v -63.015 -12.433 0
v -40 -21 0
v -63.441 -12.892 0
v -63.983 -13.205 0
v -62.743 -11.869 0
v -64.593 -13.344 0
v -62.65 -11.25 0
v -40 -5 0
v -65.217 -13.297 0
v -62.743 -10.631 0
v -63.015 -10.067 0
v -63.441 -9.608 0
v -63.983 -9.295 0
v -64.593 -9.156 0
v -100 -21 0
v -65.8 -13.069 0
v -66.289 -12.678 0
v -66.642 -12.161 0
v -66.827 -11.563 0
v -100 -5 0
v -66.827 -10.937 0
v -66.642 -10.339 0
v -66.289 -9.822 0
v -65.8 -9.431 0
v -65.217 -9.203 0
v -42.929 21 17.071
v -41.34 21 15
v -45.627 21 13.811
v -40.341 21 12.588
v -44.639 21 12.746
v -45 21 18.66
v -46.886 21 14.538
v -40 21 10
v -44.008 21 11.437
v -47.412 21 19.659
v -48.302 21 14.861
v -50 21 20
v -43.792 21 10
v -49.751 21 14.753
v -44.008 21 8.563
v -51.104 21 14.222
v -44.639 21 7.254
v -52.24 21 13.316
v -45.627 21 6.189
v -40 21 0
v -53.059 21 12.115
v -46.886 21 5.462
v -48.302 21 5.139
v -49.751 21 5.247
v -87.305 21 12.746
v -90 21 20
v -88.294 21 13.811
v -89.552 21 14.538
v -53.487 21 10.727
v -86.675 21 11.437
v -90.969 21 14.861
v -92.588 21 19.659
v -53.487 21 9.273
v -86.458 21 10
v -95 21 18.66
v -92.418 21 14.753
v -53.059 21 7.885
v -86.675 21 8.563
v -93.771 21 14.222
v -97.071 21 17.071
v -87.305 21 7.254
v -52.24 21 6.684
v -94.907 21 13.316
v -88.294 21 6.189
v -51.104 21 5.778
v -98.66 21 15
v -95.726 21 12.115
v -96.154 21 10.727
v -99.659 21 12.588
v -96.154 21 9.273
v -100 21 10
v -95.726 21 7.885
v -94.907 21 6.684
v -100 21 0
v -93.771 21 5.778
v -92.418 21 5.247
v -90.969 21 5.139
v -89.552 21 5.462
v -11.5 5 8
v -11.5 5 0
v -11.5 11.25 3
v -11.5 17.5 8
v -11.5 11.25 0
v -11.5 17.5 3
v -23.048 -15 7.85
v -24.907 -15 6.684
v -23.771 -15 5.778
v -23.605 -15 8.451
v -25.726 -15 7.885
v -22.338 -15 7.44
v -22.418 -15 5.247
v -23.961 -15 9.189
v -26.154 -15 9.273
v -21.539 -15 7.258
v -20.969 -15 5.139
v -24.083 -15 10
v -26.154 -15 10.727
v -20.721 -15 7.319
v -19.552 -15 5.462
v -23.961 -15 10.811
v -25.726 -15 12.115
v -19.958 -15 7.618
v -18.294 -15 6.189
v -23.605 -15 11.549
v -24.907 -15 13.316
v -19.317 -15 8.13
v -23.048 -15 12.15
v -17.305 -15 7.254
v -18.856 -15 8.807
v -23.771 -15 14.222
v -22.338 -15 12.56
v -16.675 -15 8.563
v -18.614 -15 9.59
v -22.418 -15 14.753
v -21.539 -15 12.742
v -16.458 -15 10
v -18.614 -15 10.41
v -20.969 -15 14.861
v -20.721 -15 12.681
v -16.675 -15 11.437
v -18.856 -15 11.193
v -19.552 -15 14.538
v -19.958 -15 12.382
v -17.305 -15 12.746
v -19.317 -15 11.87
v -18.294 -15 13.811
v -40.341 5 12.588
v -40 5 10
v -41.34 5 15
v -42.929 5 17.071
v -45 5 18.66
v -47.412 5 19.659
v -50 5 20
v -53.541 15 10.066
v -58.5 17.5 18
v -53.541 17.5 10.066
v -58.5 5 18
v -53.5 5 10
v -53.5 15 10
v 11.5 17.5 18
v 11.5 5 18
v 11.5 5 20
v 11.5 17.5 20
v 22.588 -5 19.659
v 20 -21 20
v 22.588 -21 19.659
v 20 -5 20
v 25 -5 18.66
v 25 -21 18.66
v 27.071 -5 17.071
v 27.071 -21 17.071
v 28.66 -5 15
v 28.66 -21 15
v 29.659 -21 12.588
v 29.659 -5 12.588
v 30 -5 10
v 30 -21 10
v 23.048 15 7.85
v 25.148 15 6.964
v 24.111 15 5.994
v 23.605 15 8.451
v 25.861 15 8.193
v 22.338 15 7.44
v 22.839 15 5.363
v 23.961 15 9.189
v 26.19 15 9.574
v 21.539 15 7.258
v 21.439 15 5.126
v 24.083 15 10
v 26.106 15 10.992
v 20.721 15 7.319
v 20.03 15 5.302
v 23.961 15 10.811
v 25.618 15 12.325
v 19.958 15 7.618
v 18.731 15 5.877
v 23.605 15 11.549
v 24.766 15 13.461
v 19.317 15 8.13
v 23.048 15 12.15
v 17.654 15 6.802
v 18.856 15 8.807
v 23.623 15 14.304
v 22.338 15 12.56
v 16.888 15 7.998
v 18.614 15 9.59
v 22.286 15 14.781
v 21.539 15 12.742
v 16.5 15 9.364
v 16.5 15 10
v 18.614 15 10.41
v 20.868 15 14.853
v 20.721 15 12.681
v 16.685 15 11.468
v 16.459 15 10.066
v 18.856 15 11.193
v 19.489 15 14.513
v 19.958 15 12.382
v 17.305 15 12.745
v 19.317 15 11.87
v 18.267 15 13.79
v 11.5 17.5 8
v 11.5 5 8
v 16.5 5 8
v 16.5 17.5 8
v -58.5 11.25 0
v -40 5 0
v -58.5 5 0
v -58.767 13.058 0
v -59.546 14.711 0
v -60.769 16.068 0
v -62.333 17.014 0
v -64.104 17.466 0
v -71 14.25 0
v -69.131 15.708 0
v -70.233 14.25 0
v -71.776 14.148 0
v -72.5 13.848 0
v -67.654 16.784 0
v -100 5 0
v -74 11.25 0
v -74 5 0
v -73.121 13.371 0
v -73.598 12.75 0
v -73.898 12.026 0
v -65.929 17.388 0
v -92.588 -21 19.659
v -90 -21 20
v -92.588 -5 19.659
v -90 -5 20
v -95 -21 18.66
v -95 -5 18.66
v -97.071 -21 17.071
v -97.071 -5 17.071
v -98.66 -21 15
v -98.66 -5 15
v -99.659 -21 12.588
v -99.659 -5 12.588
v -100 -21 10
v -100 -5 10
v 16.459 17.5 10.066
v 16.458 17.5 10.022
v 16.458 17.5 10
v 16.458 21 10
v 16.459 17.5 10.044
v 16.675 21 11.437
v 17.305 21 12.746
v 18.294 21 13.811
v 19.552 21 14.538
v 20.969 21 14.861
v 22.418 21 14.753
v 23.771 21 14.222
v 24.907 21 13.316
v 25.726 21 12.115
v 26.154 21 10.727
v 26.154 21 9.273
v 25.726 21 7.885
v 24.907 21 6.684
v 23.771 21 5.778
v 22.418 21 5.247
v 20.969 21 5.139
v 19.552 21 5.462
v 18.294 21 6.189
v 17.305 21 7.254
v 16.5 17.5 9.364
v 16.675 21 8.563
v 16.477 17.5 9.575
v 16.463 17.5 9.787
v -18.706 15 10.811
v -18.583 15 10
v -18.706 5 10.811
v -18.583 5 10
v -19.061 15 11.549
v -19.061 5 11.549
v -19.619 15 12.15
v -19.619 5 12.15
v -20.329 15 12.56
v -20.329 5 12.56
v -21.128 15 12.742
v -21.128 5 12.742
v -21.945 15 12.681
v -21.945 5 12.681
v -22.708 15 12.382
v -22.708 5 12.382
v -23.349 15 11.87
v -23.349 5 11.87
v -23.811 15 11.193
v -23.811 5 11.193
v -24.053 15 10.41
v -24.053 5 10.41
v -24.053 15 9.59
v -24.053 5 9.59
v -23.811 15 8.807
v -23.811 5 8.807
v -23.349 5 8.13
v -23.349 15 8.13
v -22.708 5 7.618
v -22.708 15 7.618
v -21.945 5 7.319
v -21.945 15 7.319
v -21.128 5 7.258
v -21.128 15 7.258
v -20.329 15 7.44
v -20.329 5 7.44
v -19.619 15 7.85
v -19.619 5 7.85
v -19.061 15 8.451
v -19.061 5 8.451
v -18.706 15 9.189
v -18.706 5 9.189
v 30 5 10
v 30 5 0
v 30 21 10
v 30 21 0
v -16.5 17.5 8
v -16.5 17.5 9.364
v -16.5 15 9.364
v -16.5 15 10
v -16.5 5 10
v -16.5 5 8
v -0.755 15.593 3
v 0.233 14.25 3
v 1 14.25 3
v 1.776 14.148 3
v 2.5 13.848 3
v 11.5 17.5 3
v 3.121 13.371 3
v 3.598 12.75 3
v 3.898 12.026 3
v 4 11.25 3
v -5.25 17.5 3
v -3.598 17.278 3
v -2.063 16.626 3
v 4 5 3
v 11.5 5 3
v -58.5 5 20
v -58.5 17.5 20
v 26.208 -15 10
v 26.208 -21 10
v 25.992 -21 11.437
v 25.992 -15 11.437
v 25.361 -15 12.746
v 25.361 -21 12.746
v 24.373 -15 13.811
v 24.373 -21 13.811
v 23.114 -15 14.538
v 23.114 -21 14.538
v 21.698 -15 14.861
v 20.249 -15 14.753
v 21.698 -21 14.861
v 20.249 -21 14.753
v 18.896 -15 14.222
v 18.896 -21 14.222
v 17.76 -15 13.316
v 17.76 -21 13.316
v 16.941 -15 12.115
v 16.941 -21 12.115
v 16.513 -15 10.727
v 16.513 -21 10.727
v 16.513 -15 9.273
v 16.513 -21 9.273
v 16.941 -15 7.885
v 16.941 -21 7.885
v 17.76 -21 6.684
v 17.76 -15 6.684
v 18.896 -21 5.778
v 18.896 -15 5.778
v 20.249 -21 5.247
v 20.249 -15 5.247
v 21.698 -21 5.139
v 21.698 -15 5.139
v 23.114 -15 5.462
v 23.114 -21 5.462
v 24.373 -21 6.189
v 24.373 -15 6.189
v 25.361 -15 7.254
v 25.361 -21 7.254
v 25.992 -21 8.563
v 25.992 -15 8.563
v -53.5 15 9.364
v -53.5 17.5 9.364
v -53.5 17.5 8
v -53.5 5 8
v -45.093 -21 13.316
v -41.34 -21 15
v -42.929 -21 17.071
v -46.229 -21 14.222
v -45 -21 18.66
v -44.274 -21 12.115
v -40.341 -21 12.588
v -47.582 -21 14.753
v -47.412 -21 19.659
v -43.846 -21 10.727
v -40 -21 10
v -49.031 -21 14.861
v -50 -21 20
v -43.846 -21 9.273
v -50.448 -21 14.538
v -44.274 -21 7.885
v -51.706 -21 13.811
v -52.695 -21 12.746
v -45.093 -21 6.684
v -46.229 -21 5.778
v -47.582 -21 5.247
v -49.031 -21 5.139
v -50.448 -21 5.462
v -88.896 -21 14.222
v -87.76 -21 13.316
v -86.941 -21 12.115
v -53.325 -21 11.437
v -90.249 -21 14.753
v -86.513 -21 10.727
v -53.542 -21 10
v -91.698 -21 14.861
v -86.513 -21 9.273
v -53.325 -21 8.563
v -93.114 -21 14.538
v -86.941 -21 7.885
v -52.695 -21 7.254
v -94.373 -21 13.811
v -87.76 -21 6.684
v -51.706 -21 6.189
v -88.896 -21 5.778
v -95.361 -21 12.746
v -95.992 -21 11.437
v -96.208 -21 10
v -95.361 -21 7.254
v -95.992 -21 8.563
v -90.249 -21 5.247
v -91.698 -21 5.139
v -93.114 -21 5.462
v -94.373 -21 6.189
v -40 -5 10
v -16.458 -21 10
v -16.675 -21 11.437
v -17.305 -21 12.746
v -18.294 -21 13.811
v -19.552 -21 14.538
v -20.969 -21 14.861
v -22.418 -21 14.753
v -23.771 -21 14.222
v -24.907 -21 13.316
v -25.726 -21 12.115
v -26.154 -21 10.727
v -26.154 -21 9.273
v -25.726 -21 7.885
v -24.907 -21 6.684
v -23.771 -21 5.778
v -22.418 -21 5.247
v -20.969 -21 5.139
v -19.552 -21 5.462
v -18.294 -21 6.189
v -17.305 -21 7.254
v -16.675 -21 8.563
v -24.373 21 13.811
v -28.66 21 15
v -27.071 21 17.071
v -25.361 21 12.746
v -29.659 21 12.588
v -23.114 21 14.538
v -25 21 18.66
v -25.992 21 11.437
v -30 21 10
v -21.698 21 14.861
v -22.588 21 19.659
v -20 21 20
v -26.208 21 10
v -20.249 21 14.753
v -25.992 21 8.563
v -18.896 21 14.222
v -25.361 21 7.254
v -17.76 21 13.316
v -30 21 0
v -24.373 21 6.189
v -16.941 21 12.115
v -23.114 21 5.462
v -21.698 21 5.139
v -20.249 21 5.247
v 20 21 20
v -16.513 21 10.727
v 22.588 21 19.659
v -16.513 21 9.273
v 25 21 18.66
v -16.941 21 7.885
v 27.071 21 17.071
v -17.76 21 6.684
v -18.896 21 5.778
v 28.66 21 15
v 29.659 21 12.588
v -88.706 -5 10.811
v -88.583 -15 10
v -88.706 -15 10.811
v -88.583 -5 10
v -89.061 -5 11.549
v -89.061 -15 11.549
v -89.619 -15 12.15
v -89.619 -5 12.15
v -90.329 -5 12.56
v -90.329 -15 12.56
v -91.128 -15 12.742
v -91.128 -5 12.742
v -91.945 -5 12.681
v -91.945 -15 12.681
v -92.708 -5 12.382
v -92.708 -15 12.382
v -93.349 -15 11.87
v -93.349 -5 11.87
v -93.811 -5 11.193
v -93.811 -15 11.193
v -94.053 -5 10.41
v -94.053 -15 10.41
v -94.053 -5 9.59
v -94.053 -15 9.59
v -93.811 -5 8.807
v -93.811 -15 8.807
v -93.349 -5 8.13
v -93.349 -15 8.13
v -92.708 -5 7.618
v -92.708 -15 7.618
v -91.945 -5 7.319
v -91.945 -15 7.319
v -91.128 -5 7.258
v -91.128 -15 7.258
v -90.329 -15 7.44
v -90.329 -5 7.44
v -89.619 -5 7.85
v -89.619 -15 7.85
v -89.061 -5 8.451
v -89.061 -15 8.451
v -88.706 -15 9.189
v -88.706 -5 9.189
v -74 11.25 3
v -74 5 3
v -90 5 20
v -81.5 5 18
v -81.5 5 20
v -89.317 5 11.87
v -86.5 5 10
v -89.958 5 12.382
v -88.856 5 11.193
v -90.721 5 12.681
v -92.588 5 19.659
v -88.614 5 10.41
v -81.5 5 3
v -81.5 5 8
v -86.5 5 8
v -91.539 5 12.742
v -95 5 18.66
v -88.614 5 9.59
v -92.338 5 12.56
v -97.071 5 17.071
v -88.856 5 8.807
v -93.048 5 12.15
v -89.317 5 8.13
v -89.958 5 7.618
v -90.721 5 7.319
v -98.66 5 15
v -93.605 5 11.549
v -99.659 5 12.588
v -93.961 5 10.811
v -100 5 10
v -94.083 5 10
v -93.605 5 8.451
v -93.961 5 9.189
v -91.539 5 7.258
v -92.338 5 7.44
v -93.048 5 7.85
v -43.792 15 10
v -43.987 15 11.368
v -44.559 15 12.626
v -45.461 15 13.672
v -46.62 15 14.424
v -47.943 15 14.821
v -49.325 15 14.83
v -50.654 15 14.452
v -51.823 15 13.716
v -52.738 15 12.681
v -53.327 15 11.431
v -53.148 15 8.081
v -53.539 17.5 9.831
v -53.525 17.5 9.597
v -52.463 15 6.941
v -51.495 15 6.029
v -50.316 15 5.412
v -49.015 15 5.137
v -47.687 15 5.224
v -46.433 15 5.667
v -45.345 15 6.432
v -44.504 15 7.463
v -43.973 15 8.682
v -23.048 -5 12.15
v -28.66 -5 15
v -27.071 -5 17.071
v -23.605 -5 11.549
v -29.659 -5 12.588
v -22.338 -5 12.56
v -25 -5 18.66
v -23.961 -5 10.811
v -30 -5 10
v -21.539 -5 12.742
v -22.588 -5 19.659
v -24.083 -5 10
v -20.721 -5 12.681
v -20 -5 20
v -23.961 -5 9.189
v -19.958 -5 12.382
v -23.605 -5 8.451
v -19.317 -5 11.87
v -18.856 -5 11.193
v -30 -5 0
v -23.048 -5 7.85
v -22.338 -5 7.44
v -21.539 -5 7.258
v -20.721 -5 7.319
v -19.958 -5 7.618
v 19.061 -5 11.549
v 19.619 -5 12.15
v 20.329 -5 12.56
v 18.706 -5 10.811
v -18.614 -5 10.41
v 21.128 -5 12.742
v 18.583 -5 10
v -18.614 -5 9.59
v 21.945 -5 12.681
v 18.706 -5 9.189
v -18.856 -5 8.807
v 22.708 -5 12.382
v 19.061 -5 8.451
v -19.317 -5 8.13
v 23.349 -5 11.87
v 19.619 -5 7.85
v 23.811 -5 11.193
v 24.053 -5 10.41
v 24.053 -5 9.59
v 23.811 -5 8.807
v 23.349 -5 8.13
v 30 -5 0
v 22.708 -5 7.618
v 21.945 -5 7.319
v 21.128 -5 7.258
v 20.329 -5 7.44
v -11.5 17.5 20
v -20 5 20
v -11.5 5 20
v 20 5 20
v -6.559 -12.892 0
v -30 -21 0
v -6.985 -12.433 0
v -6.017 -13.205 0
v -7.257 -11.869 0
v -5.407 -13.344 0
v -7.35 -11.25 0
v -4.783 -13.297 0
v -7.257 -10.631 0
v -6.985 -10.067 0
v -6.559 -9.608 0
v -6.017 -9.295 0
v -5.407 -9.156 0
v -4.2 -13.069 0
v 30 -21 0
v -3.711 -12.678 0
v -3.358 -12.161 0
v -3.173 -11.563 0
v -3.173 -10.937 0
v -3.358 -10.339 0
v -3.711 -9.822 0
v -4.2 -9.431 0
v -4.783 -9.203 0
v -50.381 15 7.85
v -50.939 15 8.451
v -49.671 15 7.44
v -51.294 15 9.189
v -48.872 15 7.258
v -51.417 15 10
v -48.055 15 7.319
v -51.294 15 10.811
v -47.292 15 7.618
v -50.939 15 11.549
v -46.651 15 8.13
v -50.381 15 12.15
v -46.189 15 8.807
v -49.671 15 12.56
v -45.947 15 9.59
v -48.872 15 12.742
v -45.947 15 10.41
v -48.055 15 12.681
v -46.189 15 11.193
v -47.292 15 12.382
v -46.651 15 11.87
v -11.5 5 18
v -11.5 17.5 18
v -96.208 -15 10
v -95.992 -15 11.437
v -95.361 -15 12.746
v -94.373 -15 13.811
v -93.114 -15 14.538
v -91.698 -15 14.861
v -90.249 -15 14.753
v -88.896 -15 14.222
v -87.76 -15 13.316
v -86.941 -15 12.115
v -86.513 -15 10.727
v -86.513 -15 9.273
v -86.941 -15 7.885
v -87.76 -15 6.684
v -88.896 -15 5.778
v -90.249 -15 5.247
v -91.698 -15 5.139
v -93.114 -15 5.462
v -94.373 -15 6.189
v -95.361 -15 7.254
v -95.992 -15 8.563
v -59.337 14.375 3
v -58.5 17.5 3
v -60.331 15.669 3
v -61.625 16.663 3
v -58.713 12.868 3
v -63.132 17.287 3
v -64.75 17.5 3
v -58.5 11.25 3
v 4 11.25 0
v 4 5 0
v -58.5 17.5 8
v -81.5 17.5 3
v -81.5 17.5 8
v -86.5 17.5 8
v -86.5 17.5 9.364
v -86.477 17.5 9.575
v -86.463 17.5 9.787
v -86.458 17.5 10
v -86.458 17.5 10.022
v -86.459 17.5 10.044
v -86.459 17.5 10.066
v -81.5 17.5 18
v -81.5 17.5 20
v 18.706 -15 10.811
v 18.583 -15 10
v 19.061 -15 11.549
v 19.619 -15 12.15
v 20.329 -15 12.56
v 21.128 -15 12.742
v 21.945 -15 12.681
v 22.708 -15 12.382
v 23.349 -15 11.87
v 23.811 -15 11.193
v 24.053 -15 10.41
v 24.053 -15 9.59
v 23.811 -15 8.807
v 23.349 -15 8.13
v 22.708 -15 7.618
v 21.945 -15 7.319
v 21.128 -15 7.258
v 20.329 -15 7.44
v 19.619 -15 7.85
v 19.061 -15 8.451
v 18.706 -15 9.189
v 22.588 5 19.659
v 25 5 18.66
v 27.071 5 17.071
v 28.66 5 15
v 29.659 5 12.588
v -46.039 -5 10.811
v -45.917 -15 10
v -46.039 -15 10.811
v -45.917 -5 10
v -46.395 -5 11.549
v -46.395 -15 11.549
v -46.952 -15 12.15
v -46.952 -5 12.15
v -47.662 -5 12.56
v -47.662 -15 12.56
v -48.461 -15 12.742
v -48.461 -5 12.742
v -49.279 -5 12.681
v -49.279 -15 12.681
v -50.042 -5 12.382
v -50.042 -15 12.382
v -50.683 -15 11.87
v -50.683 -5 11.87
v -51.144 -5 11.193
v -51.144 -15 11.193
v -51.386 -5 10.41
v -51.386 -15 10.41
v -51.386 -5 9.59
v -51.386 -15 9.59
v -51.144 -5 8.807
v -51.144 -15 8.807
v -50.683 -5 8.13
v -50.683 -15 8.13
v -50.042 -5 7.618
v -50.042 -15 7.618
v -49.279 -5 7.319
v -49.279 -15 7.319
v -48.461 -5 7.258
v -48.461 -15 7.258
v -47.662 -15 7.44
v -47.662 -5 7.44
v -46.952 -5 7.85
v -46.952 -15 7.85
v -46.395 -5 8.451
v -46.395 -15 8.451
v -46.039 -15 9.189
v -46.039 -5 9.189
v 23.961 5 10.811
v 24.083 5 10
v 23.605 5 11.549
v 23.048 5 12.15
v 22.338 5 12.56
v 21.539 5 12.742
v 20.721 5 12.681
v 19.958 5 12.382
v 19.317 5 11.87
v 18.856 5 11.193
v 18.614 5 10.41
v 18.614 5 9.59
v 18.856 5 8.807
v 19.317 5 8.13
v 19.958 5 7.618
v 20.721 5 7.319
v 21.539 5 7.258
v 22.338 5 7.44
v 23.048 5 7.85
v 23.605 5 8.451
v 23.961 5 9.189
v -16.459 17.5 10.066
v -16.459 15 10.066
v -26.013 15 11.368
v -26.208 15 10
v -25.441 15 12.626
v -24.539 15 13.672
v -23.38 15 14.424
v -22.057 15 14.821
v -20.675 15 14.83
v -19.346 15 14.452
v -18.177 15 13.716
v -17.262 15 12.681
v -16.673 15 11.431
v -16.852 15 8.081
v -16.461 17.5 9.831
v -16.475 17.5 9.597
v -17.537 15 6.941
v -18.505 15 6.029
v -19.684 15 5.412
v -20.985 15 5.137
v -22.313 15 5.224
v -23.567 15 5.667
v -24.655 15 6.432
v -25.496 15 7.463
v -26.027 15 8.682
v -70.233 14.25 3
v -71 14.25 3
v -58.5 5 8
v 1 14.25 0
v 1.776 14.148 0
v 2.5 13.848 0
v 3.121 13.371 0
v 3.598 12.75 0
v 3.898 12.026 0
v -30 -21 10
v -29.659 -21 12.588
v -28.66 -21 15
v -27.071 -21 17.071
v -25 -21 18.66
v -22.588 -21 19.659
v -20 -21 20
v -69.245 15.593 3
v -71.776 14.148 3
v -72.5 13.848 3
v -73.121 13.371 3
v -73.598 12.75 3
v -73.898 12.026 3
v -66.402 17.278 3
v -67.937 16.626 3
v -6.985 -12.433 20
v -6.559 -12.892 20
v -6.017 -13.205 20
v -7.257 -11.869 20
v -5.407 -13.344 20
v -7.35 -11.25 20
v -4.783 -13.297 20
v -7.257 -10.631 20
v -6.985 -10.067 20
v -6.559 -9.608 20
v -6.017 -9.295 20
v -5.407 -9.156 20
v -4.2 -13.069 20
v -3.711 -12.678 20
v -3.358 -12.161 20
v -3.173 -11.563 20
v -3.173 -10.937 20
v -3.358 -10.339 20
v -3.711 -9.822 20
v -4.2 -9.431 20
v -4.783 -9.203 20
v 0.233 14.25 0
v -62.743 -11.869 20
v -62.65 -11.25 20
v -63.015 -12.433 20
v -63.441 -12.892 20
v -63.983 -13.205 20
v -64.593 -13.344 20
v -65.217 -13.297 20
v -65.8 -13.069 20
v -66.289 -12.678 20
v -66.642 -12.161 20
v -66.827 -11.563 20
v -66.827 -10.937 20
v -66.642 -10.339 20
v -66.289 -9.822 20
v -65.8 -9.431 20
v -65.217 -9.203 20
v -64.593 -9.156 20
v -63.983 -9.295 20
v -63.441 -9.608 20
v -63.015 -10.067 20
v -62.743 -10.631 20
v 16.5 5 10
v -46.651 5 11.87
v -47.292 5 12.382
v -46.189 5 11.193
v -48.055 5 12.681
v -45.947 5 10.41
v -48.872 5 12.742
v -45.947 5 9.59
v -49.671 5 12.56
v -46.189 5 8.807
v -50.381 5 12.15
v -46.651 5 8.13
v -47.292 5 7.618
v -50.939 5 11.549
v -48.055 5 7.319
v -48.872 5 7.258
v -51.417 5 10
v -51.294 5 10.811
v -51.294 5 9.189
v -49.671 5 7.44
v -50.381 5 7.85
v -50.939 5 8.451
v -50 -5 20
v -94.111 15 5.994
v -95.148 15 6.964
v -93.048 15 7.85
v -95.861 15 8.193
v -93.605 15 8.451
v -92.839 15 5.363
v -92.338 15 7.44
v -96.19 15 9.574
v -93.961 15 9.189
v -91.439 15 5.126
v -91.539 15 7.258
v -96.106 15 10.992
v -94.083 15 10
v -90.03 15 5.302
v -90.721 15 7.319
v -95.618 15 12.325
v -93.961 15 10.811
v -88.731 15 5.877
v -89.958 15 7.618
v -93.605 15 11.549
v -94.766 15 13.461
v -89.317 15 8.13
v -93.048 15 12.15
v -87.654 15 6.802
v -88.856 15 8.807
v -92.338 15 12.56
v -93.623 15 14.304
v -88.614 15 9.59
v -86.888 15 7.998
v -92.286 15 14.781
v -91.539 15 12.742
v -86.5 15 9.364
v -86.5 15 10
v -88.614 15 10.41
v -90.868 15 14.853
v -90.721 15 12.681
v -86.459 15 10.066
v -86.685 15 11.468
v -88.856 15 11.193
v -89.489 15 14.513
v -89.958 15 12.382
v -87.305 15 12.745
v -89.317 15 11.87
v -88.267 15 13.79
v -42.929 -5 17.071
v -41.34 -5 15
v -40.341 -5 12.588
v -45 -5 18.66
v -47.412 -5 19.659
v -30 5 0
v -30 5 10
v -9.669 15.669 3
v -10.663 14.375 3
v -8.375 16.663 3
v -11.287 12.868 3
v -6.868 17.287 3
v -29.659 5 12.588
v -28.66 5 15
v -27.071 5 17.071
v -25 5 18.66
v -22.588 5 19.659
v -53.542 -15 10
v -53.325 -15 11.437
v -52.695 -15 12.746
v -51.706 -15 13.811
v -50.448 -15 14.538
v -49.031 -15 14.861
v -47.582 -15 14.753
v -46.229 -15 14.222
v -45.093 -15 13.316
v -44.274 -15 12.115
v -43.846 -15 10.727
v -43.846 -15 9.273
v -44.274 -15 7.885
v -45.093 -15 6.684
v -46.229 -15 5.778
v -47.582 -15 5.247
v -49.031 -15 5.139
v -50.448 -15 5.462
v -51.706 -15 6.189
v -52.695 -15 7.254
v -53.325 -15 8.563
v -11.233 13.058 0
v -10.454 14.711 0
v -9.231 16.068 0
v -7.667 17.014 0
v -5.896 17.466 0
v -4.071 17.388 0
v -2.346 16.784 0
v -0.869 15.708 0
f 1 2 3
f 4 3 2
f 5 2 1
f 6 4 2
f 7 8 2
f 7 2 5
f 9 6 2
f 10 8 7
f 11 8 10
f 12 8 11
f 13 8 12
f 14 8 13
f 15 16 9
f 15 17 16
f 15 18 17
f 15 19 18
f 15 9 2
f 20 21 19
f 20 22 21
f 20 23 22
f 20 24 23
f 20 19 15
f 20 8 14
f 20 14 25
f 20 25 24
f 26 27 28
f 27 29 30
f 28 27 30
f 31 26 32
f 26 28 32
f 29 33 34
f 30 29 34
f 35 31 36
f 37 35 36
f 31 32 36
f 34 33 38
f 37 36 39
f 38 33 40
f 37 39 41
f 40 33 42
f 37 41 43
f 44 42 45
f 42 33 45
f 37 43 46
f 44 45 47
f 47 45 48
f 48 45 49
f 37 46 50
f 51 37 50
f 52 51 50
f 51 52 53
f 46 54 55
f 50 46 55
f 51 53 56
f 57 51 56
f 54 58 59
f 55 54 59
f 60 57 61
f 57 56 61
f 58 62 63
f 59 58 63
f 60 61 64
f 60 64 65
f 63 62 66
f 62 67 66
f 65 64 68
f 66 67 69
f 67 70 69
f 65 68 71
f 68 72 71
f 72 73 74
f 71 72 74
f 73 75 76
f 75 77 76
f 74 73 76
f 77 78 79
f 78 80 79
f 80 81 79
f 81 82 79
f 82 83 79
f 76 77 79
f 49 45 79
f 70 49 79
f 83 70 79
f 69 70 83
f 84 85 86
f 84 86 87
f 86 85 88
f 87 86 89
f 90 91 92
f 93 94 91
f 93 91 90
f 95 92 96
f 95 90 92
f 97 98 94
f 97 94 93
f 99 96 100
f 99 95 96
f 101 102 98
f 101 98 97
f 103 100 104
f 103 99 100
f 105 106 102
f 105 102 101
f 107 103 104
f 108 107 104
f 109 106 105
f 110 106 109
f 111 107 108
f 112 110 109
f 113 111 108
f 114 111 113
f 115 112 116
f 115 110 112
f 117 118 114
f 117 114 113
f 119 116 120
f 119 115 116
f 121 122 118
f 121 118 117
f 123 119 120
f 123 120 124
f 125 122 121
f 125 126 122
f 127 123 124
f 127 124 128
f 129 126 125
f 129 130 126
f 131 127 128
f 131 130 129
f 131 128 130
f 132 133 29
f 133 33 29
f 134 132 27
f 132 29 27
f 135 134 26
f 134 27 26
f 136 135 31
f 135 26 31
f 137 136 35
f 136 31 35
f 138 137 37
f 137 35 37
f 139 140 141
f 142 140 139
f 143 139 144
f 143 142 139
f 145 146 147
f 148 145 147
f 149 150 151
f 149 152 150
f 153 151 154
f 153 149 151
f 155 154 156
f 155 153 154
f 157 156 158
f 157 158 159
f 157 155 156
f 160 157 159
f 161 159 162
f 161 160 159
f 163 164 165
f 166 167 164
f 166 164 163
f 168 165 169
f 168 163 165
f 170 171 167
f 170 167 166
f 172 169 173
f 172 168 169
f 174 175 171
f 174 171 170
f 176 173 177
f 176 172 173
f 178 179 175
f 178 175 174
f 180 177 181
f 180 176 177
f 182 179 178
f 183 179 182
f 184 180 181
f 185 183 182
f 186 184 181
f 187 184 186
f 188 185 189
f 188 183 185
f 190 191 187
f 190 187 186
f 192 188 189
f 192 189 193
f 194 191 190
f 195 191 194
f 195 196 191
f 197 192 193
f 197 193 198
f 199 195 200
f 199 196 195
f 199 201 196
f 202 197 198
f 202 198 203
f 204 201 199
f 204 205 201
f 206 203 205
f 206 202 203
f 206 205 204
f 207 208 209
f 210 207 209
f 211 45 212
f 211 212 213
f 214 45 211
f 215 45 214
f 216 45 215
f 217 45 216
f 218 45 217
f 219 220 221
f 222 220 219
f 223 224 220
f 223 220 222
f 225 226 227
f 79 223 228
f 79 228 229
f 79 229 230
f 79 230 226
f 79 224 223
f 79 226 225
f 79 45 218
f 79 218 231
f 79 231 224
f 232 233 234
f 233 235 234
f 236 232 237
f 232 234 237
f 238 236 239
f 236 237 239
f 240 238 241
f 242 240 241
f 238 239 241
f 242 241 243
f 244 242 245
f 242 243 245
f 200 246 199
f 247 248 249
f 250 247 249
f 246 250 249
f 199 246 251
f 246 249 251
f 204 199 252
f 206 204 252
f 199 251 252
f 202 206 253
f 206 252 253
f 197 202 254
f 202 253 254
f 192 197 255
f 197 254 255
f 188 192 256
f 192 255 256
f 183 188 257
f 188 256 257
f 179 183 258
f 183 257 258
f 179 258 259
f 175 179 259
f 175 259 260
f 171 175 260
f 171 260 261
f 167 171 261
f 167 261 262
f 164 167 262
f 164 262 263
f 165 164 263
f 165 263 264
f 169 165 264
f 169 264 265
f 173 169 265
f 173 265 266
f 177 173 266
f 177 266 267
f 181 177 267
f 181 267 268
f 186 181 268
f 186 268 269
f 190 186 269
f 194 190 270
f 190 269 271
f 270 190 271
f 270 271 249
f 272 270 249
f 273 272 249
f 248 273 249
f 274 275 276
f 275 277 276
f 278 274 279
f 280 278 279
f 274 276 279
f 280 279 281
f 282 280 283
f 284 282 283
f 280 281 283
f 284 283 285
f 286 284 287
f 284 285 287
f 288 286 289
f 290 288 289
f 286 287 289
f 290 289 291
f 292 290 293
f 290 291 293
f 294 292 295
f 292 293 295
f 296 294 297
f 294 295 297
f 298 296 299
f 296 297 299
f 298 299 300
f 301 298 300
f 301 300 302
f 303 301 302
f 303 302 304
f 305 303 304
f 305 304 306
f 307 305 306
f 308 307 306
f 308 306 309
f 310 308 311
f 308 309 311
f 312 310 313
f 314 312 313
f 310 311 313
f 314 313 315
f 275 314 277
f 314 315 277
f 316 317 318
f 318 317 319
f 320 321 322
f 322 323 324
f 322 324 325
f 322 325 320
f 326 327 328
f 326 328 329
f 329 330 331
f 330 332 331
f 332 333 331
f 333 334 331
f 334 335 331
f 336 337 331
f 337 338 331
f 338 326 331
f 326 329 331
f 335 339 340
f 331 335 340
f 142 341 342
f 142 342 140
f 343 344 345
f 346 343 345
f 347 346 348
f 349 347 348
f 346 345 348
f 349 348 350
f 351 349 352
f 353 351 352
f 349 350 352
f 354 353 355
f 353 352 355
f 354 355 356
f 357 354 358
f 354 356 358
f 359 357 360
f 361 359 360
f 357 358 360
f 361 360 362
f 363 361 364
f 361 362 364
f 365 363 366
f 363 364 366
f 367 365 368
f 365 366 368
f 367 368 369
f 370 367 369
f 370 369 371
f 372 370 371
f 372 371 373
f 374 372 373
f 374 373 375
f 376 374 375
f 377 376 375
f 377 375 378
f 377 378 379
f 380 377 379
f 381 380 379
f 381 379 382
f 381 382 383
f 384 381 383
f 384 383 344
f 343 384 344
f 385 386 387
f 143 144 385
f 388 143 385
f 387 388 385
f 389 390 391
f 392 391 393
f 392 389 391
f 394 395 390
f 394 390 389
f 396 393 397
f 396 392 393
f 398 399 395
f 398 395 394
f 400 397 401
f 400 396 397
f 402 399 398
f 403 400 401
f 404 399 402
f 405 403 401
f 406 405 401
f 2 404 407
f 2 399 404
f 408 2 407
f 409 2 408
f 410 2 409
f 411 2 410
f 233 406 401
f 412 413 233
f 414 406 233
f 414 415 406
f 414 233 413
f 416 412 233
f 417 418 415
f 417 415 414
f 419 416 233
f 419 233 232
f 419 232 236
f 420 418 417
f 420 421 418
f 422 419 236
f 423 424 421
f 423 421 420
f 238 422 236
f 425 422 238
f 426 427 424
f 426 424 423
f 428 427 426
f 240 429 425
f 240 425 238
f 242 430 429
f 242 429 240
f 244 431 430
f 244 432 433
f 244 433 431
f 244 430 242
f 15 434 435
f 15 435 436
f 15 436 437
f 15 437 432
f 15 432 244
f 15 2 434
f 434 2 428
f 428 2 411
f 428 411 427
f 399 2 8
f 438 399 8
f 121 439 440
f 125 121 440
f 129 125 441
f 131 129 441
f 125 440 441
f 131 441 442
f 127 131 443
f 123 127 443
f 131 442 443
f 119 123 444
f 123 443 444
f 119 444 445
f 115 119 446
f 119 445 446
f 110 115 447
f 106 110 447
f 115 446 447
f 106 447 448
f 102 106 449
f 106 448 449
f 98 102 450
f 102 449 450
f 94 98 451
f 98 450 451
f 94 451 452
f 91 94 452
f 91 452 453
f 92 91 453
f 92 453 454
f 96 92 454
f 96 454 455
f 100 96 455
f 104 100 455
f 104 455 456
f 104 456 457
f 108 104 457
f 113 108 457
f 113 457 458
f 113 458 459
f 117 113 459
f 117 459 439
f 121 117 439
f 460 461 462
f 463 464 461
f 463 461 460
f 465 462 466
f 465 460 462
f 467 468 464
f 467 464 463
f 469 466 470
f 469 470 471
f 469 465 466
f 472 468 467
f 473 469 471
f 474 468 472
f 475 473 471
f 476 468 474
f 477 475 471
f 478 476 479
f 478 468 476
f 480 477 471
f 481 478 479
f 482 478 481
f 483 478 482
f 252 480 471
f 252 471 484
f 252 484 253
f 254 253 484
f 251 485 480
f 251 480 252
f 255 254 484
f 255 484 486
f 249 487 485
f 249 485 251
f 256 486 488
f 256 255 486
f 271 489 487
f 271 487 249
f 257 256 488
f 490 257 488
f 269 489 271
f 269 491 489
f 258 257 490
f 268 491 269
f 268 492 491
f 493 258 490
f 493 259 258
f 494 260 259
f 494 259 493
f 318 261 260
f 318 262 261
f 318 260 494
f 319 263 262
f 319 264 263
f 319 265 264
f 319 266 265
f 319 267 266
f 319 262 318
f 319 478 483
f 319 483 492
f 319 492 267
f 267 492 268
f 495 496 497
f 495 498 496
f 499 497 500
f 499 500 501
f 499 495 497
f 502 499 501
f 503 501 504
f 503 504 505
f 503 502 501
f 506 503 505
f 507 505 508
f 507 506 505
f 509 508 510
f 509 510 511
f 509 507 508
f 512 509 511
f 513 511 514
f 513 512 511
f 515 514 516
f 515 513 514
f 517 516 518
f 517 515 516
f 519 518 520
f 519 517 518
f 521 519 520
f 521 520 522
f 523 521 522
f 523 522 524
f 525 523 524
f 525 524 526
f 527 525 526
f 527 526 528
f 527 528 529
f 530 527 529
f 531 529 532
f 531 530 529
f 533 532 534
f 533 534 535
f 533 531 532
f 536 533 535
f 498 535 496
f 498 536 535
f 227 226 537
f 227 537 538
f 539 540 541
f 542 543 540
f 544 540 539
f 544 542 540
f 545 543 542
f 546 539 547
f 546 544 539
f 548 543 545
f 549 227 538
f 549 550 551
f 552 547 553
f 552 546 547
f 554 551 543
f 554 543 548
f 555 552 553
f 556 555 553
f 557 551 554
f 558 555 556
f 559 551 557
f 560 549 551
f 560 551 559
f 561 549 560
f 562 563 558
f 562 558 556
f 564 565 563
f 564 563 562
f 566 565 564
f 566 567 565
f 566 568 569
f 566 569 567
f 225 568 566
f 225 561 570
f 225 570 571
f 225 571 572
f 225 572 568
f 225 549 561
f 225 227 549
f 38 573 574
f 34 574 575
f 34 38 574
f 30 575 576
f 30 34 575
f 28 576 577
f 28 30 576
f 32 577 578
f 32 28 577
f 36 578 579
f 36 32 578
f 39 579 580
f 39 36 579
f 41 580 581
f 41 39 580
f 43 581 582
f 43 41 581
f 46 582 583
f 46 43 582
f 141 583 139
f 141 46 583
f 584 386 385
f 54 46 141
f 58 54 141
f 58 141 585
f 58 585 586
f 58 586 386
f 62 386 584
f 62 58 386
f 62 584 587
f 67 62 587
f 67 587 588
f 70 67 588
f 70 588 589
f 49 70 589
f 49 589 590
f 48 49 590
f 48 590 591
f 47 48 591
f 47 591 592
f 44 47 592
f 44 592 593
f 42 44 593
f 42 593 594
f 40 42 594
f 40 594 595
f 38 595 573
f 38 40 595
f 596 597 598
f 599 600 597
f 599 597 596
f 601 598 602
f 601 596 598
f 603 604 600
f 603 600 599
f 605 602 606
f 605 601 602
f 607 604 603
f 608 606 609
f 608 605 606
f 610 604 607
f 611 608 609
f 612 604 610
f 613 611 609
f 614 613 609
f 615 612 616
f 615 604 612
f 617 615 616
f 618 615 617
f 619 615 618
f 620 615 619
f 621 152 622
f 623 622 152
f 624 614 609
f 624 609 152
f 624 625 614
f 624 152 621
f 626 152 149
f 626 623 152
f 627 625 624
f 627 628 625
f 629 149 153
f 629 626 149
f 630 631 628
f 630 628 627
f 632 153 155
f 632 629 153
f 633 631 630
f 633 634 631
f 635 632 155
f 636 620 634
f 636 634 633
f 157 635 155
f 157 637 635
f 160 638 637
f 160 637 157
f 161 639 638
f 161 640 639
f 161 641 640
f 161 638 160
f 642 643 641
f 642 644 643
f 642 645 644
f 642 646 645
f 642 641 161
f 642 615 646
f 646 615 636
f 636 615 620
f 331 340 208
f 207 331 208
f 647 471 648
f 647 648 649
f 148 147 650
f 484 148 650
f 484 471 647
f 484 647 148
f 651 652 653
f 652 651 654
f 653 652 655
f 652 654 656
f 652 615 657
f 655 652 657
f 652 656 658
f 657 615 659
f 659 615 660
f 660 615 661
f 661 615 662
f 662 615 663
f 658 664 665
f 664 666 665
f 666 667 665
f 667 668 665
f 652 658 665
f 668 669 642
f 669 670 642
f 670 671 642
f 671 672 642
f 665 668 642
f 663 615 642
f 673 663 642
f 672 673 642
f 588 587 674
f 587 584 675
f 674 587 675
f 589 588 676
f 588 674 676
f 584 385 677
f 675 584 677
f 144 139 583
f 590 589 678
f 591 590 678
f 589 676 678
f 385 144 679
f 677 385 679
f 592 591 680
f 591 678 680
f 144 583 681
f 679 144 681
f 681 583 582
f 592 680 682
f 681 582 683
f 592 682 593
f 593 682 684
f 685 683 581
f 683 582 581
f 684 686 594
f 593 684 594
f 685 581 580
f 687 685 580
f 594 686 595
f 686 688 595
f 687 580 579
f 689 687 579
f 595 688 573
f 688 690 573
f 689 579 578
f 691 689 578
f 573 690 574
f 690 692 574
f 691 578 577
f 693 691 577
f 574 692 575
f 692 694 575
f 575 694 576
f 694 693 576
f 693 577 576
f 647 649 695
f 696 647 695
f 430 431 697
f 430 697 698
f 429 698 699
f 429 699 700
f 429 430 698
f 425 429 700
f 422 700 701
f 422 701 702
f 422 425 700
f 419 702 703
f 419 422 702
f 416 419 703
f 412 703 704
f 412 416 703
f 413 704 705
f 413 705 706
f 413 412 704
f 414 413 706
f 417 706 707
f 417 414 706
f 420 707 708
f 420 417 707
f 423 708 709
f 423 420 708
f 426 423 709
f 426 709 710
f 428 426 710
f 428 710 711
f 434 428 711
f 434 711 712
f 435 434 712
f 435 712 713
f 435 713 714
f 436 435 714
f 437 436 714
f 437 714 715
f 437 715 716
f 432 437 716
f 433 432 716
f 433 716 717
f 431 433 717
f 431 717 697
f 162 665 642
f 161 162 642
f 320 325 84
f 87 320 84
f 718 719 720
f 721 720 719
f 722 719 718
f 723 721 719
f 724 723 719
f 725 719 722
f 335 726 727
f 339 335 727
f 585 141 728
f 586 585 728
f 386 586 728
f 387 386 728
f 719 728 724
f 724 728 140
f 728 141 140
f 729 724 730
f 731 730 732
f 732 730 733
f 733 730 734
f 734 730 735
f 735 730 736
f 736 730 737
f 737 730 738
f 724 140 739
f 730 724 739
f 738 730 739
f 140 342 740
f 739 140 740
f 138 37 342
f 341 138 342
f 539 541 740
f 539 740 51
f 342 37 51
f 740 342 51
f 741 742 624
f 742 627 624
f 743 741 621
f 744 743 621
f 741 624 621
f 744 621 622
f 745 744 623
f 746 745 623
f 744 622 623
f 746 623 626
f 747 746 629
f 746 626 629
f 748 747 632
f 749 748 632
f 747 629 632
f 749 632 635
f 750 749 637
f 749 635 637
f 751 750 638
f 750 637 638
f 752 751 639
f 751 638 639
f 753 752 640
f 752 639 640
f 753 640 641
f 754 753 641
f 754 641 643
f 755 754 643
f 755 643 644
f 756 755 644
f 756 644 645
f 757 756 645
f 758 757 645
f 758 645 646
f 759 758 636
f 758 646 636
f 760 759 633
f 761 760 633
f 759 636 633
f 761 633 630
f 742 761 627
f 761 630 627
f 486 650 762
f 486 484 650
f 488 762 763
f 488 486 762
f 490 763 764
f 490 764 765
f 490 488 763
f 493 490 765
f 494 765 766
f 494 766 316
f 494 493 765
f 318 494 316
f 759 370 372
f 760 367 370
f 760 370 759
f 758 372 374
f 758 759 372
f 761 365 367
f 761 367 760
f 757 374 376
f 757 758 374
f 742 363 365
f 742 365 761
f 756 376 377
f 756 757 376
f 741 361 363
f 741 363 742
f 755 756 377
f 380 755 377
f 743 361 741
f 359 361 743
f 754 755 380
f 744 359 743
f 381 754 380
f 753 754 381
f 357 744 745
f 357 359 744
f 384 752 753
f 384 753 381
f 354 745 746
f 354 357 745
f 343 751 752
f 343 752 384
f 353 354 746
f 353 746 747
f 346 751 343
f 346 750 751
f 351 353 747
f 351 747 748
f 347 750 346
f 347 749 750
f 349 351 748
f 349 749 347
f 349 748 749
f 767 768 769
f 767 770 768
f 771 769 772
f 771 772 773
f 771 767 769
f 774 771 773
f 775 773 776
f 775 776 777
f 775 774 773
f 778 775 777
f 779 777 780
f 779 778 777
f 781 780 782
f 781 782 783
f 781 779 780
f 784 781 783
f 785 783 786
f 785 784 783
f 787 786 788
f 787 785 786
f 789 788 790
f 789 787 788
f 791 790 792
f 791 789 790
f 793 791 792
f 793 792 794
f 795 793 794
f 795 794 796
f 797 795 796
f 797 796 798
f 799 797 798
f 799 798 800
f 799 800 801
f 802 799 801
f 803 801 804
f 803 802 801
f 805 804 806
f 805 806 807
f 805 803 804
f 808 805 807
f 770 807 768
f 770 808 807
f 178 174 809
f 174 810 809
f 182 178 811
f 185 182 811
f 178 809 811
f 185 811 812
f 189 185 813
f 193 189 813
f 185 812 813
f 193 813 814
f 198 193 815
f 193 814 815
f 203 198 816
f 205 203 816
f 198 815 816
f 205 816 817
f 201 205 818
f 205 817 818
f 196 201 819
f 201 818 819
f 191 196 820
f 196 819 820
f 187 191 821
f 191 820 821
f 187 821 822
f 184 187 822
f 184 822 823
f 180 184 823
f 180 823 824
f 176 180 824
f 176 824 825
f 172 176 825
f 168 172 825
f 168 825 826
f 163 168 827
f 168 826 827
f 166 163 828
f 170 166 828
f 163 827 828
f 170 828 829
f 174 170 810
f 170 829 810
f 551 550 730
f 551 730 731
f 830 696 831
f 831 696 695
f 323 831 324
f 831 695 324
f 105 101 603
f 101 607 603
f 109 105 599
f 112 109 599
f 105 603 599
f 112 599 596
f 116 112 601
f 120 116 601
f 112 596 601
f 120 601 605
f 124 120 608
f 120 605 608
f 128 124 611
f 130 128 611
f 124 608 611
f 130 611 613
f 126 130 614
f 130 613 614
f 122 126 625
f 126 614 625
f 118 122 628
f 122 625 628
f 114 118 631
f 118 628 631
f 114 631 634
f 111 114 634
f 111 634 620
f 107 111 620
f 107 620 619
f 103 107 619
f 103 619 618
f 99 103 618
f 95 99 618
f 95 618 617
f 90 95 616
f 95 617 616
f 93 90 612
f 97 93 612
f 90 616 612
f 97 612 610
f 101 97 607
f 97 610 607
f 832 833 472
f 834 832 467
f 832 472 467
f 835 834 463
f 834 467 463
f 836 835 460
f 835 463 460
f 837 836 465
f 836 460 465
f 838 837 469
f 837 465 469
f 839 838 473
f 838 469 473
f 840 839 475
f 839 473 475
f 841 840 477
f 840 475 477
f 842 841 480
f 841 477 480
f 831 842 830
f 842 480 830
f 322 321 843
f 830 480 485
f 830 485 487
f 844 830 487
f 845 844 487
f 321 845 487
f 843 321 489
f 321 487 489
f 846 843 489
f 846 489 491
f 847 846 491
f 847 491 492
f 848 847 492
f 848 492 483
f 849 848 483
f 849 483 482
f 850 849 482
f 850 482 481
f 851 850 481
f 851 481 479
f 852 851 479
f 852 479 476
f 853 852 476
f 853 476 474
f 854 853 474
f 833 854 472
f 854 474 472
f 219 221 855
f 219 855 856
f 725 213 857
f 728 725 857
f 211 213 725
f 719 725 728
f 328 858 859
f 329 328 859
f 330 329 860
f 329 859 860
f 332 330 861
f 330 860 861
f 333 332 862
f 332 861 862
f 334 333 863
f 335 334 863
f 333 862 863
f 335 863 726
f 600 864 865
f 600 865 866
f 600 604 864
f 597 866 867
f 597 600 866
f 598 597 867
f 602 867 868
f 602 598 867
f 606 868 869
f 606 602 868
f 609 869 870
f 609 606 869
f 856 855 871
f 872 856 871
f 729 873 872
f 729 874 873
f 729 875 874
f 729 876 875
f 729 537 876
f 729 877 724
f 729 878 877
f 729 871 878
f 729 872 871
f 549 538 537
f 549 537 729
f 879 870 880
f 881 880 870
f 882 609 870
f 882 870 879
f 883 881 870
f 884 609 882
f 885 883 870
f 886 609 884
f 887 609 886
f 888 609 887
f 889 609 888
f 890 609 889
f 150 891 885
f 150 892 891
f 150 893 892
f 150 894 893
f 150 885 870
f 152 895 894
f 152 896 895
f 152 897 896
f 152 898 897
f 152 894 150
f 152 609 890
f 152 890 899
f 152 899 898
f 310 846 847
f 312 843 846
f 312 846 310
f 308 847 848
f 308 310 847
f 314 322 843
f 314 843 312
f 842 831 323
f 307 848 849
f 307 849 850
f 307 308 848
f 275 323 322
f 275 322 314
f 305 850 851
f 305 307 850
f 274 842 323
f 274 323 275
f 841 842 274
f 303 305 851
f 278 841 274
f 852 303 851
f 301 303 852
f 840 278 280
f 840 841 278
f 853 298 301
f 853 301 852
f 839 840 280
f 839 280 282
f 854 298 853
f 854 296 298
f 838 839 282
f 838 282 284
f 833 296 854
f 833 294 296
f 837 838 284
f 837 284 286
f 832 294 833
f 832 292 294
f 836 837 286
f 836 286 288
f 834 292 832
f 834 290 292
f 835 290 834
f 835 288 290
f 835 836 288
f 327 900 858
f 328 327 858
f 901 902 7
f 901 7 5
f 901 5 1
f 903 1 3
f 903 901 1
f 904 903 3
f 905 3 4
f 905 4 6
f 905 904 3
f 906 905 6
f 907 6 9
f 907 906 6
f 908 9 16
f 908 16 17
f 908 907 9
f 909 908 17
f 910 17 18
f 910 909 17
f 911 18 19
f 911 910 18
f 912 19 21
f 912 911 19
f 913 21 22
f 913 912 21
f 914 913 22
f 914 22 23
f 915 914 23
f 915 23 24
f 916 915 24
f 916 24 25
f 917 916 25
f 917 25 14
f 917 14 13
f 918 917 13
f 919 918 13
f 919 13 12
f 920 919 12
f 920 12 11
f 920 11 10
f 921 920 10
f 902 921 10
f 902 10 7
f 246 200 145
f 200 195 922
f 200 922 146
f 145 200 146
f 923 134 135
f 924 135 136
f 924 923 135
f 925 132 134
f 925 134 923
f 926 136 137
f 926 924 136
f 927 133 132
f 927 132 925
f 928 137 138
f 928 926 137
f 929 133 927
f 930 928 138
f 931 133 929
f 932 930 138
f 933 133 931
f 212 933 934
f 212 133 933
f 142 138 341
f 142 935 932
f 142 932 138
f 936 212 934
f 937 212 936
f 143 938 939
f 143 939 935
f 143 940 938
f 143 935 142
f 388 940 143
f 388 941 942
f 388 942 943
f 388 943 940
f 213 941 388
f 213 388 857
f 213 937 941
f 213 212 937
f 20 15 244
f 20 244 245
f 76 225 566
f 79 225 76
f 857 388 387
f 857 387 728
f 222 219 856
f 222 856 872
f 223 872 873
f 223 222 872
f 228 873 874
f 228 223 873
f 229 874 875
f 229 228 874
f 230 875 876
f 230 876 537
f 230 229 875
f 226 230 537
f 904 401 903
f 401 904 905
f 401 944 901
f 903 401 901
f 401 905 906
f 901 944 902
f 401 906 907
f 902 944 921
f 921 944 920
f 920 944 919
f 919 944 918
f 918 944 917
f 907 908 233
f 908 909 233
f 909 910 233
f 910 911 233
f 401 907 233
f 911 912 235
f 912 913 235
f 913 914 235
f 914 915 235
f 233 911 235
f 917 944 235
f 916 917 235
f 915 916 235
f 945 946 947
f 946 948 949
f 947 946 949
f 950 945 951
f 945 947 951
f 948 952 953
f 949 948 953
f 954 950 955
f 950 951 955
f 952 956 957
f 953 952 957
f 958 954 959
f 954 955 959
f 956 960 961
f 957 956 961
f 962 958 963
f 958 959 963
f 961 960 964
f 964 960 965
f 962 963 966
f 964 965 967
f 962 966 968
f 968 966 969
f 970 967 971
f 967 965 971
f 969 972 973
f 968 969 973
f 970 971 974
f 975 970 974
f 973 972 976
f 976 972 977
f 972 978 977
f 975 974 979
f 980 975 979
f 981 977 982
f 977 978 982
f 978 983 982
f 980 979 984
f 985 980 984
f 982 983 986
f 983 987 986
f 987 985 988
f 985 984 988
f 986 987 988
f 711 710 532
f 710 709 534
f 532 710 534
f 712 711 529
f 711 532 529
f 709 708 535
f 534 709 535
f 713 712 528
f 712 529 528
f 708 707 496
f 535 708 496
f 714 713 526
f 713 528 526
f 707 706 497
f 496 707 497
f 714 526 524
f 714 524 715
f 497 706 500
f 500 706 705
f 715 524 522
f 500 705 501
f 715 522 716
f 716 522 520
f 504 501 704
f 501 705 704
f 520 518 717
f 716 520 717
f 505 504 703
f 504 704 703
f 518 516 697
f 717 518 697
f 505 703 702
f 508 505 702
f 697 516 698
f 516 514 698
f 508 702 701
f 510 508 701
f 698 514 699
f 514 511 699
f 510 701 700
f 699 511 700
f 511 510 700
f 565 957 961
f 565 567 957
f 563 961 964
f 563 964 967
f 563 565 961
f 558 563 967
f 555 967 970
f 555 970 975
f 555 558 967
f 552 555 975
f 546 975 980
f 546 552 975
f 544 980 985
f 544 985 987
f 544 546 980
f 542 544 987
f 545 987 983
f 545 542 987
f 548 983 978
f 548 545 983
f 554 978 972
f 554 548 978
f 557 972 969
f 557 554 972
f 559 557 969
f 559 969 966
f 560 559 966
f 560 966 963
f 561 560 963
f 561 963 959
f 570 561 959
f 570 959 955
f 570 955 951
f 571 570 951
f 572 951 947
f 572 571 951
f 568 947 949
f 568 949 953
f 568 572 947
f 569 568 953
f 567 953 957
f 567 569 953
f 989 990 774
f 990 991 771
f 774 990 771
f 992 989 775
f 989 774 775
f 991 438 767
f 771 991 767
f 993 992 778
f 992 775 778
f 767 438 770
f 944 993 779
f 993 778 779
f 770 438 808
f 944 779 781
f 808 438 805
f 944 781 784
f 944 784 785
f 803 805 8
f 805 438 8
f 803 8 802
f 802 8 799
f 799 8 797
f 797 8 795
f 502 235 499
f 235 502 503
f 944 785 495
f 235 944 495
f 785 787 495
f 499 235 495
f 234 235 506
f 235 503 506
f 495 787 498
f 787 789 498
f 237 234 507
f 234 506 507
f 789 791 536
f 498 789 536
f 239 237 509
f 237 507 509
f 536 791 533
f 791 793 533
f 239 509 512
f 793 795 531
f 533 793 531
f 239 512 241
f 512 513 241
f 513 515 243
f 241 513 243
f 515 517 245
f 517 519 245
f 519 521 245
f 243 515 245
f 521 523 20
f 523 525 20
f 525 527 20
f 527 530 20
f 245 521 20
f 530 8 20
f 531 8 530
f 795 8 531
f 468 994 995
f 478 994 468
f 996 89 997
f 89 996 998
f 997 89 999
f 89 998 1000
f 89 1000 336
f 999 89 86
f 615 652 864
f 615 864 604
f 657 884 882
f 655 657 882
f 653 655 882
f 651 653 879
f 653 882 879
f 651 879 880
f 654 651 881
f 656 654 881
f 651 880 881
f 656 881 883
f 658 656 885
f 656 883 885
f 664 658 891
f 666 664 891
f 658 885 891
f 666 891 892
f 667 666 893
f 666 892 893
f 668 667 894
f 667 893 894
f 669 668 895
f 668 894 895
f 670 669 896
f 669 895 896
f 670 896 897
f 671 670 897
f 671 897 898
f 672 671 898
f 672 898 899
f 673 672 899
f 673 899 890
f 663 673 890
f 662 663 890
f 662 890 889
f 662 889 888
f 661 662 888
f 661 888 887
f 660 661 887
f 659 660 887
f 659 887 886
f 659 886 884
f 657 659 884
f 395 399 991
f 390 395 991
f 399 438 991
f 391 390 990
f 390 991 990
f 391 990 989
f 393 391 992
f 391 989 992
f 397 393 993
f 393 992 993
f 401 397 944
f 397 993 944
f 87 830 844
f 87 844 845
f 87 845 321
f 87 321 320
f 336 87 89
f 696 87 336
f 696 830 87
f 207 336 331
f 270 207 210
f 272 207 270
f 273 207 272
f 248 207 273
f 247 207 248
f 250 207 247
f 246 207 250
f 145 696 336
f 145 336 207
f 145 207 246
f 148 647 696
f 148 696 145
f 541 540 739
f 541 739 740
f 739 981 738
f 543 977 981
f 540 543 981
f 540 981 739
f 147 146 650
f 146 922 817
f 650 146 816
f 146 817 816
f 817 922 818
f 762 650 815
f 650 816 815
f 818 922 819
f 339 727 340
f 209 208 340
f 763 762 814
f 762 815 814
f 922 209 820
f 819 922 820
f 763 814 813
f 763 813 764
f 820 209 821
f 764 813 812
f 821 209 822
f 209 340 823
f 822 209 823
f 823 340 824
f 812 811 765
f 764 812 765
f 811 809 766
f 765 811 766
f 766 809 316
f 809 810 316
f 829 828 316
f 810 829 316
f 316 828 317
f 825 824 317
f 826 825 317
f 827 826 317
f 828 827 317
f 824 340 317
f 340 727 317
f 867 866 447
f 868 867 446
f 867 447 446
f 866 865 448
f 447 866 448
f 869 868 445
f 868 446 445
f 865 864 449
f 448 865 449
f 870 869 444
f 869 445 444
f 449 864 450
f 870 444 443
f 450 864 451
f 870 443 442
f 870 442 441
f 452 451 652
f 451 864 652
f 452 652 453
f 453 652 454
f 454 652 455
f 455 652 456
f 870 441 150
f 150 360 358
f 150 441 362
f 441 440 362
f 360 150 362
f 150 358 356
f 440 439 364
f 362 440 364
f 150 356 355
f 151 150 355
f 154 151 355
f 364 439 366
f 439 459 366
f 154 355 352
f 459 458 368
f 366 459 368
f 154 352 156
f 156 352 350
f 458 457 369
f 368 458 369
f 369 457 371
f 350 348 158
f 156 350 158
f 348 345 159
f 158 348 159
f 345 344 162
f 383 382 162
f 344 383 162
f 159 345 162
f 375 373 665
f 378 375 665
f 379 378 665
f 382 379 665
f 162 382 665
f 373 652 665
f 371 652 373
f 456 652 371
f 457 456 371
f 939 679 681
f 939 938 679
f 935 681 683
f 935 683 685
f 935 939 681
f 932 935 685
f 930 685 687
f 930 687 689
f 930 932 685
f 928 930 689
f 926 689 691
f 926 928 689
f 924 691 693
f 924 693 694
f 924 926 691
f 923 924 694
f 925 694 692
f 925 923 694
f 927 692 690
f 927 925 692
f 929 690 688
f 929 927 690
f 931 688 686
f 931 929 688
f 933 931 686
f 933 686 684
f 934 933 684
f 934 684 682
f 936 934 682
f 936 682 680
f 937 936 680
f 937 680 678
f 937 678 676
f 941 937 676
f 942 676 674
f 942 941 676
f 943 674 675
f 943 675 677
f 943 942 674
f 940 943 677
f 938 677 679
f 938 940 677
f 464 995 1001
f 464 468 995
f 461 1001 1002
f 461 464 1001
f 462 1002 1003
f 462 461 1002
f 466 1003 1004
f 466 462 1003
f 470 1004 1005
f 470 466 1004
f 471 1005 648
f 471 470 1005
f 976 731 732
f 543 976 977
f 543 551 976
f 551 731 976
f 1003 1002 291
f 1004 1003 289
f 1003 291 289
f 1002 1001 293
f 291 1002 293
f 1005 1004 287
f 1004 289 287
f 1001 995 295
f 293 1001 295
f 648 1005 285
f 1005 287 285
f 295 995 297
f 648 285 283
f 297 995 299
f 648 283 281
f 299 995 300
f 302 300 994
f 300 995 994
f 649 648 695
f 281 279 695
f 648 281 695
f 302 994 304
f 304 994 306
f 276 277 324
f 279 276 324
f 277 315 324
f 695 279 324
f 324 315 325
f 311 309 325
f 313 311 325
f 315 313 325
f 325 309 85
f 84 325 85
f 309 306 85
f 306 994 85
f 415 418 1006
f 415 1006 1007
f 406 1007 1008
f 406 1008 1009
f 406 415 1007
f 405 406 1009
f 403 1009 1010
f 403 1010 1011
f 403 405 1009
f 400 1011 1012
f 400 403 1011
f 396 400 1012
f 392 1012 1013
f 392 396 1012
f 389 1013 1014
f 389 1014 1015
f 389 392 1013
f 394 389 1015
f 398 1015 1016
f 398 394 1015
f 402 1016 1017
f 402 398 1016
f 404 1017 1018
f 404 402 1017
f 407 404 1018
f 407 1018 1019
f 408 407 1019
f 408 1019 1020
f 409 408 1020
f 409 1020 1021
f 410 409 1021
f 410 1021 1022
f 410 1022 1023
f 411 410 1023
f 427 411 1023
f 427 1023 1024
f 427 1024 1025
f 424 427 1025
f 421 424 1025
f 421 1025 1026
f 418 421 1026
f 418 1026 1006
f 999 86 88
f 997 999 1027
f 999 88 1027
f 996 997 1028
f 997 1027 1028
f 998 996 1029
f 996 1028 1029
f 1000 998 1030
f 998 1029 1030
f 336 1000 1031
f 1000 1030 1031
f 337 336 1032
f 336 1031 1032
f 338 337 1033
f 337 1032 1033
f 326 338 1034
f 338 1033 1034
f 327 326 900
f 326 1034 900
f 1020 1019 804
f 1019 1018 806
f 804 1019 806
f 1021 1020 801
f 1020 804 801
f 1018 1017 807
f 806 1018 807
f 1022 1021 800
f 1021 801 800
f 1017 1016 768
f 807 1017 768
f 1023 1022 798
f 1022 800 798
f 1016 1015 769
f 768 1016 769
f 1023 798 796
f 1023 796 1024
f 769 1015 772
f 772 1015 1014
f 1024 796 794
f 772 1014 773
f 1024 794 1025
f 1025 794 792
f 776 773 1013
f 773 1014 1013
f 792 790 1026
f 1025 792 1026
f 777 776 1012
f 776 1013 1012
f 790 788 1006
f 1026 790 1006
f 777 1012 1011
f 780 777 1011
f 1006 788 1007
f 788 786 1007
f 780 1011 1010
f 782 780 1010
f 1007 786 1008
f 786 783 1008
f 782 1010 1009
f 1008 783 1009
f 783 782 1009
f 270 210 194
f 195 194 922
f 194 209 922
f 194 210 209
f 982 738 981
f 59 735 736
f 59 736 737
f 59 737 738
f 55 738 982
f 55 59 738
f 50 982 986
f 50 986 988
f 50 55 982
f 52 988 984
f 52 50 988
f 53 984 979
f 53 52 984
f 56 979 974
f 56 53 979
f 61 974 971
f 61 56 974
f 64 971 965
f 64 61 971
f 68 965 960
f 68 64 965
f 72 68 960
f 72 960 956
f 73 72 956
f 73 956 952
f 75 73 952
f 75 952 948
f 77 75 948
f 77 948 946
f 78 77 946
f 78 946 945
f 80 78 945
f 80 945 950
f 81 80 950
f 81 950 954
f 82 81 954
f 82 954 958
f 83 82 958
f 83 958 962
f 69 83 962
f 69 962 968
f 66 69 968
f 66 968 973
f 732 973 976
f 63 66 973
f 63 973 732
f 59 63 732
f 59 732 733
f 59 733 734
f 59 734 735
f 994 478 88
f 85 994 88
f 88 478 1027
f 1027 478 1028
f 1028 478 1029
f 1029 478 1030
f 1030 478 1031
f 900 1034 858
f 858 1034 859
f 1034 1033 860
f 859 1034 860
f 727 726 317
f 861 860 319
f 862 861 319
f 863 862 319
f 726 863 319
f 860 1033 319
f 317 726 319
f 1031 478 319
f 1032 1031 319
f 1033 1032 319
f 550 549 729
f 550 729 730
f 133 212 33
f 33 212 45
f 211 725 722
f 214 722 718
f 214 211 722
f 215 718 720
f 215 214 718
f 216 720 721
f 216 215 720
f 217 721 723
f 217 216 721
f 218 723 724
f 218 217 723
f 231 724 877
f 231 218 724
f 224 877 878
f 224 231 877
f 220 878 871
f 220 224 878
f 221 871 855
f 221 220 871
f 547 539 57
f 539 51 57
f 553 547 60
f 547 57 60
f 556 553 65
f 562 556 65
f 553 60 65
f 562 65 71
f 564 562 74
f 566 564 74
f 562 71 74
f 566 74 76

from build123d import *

# Parameters (mm, degrees)
F0_W           = 60
F0_H           = 16
F1_DEPTH       = 20
F3_D           = 5.5
F3_CBORE_D     = 9.75
F3_CBORE_DEPTH = 6
F5_DEPTH       = 12.5
F7_DEPTH       = 3
F9_D           = 5.5
F9_CBORE_D     = 9.75
F9_CBORE_DEPTH = 6
F10_D          = 4.2
F13_R          = 10
F13_2_R        = 10
F13_3_R        = 10
F13_4_R        = 10


with BuildPart() as f1:
    # F0 (on Top) → F1 (new body)
    with BuildSketch(Plane.XY):
        with Locations((0, 13)):
            Rectangle(F0_W, F0_H)
    extrude(amount=F1_DEPTH)

    # F3 (through all)
    with Locations(Plane(origin=(0, 21, 0), x_dir=(-1, 0, 0), z_dir=(0, 1, 0))):
        with Locations((-21.3333333333, 10), (21.3333333333, 10)):
            CounterBoreHole(F3_D / 2, F3_CBORE_D / 2, F3_CBORE_DEPTH)

    # F4 (on face) → F5 (cut)
    with BuildSketch(Plane.XZ.offset(-5)):
        Polygon((11.5, 8), (16.5, 8), (16.5, 10), (11.5, 18), (11.5, 20), (-11.5, 20), (-11.5, 18), (-16.5, 10), (-16.5, 8), (-11.5, 8), (-11.5, 3), (11.5, 3), align=None)
    extrude(amount=-F5_DEPTH, mode=Mode.SUBTRACT)

    # F6 (on face) → F7 (cut, through all)
    with BuildSketch(Plane(origin=(0, 0, 0), x_dir=(1, 0, 0), z_dir=(0, 0, -1))):
        with BuildLine():
            Line((-11.5, -4), (-11.5, -11.25))
            ThreePointArc((-11.5, -11.25), (-6.7982570343, -17.3051961286), (0.2329280499, -14.25))
            Line((0.2329280499, -14.25), (1, -14.25))
            ThreePointArc((1, -14.25), (3.1213203436, -13.3713203436), (4, -11.25))
            Line((4, -11.25), (4, -4))
            Line((4, -4), (-11.5, -4))
        make_face()
    extrude(amount=-F7_DEPTH, mode=Mode.SUBTRACT)


with BuildPart() as f1b:
    # F0 (on Top) → F1, piece 2 (new body)
    with BuildSketch(Plane.XY):
        with Locations((0, -13)):
            Rectangle(F0_W, F0_H)
    extrude(amount=F1_DEPTH)

    # F9 (through all)
    with Locations(Plane.XZ.offset(21)):
        with Locations((-21.3333333333, 10), (21.3333333333, 10)):
            CounterBoreHole(F9_D / 2, F9_CBORE_D / 2, F9_CBORE_DEPTH)

    # F10 (through all)
    with Locations(Plane(origin=(0, 0, 0), x_dir=(1, 0, 0), z_dir=(0, 0, -1))):
        with Locations((-5.25, 11.25)):
            Hole(F10_D / 2)


with BuildPart() as f11_1:
    # F11: instance of F1b
    add(f1b.part.mirror(Plane.YZ))


with BuildPart() as f11_2:
    # F11: instance of F1
    add(f1.part.mirror(Plane.YZ))


with BuildPart() as f11_2_1:
    # F12: moved
    add(f11_2.part.moved(Location((-70, 0, 0))))

    # F13#4
    f13_4_edges = [f11_2_1.edges().sort_by_distance(p)[0] for p in [
        (-40, 13, 20),
        (-100, 13, 20),
    ]]
    fillet(f13_4_edges, radius=F13_4_R)


with BuildPart() as f11_1_1:
    # F12: moved
    add(f11_1.part.moved(Location((-70, 0, 0))))

    # F13#3
    f13_3_edges = [f11_1_1.edges().sort_by_distance(p)[0] for p in [
        (-40, -13, 20),
        (-100, -13, 20),
    ]]
    fillet(f13_3_edges, radius=F13_3_R)


with BuildPart() as f1b_1:
    add(f1b.part)

    # F13
    f13_edges = [f1b_1.edges().sort_by_distance(p)[0] for p in [
        (30, -13, 20),
        (-30, -13, 20),
    ]]
    fillet(f13_edges, radius=F13_R)


with BuildPart() as f1_1:
    add(f1.part)

    # F13#2
    f13_2_edges = [f1_1.edges().sort_by_distance(p)[0] for p in [
        (30, 13, 20),
        (-30, 13, 20),
    ]]
    fillet(f13_2_edges, radius=F13_2_R)


solid = Compound([f11_2_1.part, f11_1_1.part, f1b_1.part, f1_1.part])
